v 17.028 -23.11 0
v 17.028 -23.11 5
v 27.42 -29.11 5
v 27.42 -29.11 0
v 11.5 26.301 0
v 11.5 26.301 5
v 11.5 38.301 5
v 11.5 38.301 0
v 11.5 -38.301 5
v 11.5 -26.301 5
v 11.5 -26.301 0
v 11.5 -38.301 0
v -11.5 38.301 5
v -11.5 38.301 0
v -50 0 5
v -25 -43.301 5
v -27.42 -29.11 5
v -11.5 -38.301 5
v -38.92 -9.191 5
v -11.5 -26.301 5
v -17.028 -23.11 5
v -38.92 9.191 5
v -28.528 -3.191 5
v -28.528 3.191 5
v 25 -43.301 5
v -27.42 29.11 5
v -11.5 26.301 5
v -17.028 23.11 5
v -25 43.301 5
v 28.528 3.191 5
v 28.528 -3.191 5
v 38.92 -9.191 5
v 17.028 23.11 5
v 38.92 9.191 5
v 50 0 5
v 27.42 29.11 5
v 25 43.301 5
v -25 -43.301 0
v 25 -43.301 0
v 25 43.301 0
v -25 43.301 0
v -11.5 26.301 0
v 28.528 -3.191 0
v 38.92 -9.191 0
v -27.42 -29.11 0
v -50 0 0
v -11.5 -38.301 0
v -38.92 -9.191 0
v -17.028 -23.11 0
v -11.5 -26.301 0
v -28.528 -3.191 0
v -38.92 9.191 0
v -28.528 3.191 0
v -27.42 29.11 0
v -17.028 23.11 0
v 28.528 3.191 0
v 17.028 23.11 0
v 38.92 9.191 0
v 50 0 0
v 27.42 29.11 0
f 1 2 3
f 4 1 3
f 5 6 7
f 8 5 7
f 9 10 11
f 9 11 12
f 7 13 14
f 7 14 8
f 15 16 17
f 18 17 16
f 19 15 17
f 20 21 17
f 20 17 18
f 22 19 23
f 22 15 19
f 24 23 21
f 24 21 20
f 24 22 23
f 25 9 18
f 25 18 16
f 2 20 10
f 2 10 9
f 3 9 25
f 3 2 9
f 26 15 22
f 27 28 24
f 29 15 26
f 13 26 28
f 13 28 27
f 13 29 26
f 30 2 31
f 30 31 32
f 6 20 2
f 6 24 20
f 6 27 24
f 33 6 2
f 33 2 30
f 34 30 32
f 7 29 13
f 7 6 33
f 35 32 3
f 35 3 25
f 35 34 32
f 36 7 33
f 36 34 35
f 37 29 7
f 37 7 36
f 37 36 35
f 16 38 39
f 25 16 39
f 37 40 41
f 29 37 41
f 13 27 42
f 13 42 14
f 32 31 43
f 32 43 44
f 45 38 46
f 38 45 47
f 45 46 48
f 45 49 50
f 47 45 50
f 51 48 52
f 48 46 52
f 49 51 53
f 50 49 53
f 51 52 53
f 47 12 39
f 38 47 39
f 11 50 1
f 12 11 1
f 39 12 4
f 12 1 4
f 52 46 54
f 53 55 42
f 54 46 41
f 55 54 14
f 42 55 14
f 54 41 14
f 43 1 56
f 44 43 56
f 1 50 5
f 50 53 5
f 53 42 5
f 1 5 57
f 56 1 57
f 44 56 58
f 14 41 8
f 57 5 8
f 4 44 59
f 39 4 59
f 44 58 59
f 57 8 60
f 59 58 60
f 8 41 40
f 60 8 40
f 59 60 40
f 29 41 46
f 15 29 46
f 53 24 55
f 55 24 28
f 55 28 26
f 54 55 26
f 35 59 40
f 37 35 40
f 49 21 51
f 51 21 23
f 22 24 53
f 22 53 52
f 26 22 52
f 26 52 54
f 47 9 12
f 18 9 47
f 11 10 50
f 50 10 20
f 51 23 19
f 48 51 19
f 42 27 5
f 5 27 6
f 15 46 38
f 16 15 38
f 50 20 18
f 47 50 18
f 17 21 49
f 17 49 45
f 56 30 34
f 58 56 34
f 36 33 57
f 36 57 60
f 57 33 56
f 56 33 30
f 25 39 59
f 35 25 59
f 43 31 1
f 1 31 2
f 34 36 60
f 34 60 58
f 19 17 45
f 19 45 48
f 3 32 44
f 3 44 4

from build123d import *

# Parameters (mm, degrees)
PAD_DEPTH             = 5
SKETCH001_W           = 23
SKETCH001_H           = 12
POCKET_DEPTH          = 5
POLARPATTERN_COUNT    = 2
POLARPATTERN001_COUNT = 6


with BuildPart() as part:
    # Sketch → Pad (new body)
    with BuildSketch(Plane.XY):
        Polygon((-25, -43.30127), (25, -43.30127), (50, 0), (25, 43.30127), (-25, 43.30127), (-50, 0), align=None)
    extrude(amount=PAD_DEPTH)

    # Sketch001 (on Face8 of Pad) → Pocket (cut)
    with BuildSketch(Plane.XY.offset(5)):
        with Locations((0, 32.30127)):
            Rectangle(SKETCH001_W, SKETCH001_H)
    pocket = extrude(amount=-POCKET_DEPTH, mode=Mode.SUBTRACT)

    # PolarPattern: Pocket ×2 about axis
    polarpattern_axis = Axis((0, 0, 5), (0, 0, 1))
    for i in range(1, POLARPATTERN_COUNT):
        add(pocket.rotate(polarpattern_axis, i * 360 / POLARPATTERN_COUNT), mode=Mode.SUBTRACT)

    # PolarPattern001: Pocket ×6 about axis
    polarpattern001_axis = Axis((0, 0, 0), (0, 0, 1))
    for i in range(1, POLARPATTERN001_COUNT):
        add(pocket.rotate(polarpattern001_axis, i * 360 / POLARPATTERN001_COUNT), mode=Mode.SUBTRACT)


solid = part.part
